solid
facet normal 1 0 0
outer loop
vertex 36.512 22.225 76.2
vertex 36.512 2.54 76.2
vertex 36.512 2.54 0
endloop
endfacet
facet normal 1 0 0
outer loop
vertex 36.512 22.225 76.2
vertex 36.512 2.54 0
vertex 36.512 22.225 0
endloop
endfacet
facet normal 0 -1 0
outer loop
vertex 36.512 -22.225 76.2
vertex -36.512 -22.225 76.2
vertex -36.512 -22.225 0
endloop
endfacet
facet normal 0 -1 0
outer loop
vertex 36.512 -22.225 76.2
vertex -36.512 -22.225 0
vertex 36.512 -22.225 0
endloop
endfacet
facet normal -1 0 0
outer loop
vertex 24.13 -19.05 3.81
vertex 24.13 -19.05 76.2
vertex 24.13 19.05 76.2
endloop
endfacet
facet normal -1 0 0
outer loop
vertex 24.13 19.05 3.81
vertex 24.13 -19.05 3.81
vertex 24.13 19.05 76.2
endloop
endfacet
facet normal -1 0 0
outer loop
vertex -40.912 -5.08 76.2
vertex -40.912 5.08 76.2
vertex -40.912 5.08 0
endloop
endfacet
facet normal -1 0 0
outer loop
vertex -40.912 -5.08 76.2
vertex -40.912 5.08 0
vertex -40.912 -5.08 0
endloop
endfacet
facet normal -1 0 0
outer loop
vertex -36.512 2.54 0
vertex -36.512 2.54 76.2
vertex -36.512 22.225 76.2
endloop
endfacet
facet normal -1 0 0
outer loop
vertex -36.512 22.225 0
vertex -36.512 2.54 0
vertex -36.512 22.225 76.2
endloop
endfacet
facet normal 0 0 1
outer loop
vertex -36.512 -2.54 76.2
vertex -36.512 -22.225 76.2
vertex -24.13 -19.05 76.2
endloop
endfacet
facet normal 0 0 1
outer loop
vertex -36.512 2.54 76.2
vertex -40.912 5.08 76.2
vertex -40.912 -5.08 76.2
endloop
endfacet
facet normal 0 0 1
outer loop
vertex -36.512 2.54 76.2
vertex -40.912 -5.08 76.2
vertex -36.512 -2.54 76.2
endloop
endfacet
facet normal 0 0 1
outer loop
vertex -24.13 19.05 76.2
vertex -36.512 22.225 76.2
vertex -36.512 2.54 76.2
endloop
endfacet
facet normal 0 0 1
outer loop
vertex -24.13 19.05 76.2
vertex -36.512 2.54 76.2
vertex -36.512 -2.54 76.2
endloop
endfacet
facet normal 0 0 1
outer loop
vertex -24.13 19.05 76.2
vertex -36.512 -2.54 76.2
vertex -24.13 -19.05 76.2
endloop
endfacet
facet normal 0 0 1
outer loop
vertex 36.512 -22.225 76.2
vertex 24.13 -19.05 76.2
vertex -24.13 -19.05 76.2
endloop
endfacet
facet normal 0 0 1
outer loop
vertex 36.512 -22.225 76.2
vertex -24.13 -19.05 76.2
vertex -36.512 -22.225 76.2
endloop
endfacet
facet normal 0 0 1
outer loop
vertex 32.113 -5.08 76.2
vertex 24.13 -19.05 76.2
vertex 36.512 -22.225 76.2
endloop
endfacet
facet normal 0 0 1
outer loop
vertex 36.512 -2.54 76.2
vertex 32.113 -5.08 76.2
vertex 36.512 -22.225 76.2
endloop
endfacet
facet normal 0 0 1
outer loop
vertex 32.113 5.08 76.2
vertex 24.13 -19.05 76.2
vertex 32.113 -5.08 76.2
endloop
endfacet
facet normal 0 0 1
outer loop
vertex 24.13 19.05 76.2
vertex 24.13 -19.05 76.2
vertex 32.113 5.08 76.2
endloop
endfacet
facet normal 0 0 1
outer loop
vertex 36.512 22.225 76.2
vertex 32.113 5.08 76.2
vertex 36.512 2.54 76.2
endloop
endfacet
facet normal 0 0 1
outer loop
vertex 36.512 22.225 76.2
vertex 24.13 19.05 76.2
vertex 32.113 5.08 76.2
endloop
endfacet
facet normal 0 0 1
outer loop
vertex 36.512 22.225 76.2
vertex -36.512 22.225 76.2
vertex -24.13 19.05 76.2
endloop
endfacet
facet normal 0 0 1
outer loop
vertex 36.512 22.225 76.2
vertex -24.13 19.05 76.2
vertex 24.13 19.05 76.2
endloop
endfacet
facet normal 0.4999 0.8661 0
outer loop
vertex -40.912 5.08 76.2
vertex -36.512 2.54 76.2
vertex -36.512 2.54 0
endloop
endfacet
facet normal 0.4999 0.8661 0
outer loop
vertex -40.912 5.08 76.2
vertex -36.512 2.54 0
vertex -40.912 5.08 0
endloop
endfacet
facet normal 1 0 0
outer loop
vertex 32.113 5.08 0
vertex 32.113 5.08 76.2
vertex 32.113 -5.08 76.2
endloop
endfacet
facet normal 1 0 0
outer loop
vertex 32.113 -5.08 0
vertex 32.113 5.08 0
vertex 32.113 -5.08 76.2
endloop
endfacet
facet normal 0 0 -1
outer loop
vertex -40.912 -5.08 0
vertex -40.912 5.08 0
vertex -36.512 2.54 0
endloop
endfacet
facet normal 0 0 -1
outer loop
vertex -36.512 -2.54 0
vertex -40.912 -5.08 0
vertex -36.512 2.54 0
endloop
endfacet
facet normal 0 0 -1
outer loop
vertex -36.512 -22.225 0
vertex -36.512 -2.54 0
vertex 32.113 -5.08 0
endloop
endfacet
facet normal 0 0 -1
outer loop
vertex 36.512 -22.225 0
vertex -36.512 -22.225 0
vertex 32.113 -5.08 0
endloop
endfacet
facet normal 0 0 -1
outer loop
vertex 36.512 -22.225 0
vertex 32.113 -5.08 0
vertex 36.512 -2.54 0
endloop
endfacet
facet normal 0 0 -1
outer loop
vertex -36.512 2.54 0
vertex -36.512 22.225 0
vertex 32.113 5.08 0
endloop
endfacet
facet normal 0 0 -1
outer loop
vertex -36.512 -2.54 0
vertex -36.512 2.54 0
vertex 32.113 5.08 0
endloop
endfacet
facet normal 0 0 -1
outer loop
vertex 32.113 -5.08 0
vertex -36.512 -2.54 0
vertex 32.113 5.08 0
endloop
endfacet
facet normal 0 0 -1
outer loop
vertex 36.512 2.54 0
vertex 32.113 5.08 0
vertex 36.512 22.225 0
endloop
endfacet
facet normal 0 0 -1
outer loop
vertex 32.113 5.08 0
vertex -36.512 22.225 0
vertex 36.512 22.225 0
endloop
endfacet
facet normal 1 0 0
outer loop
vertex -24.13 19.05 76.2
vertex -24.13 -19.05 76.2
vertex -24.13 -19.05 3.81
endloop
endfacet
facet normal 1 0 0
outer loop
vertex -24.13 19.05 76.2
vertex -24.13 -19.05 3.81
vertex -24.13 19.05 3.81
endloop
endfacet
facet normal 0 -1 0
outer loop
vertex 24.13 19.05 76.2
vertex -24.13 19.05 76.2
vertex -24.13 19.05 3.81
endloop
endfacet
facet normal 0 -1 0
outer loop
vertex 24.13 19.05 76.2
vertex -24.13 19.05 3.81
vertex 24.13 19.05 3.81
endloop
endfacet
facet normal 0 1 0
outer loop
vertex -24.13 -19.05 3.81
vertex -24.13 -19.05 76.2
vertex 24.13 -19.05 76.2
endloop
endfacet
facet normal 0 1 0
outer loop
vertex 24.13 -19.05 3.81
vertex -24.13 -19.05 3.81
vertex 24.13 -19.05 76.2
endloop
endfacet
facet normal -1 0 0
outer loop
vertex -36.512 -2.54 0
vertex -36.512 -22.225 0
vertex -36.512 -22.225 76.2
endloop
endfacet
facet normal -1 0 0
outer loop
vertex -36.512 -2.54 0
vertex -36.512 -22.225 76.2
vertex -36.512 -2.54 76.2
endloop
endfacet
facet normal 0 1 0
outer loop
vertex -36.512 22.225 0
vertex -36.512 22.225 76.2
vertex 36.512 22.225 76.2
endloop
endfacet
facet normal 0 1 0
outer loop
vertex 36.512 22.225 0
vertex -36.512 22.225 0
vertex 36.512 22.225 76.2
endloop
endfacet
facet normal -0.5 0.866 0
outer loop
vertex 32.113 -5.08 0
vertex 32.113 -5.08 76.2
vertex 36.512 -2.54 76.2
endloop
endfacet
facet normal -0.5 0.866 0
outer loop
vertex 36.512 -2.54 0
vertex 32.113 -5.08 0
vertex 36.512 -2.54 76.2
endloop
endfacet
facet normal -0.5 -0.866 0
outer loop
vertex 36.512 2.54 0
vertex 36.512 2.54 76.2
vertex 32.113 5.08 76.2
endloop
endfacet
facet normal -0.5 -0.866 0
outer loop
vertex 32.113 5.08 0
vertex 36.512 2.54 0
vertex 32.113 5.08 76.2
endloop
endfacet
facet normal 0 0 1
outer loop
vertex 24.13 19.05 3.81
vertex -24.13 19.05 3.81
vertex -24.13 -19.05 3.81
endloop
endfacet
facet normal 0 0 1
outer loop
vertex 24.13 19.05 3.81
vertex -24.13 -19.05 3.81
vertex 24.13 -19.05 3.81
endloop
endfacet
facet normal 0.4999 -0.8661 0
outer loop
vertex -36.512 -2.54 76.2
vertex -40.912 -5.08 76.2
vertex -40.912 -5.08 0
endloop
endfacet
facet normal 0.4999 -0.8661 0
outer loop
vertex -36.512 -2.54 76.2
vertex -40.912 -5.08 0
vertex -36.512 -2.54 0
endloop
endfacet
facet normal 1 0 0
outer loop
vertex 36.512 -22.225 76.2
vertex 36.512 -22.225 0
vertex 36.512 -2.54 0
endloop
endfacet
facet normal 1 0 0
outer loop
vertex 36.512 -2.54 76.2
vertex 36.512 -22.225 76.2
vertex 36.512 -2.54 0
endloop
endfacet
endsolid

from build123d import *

# Parameters (mm, degrees)
F0_W     = 73.025
F0_H     = 44.45
F1_DEPTH = 76.2
F2_W     = 48.26
F2_H     = 38.1
F3_DEPTH = 72.39
F5_DEPTH = 76.2
F6_DEPTH = 76.2


with BuildPart() as f1:
    # F0 (on Top) → F1 (new body)
    with BuildSketch(Plane.XY):
        Rectangle(F0_W, F0_H)
    extrude(amount=F1_DEPTH)

    # F2 (on face) → F3 (cut)
    with BuildSketch(Plane.XY.offset(76.2)):
        Rectangle(F2_W, F2_H)
    extrude(amount=-F3_DEPTH, mode=Mode.SUBTRACT)

    # F4 (on face) → F5 (cut)
    with BuildSketch(Plane.XY.offset(76.2)):
        Polygon((36.5125, -2.54), (36.5125, 0), (36.5125, 2.54), (32.113091, 5.08), (32.113091, -5.08), align=None)
    extrude(amount=-F5_DEPTH, mode=Mode.SUBTRACT)

    # F4 (on face) → F6 (join)
    with BuildSketch(Plane.XY.offset(76.2)):
        Polygon((-36.5125, 0), (-36.5125, 2.54), (-40.911909, 5.08), (-40.911909, -5.08), (-36.5125, -2.54), align=None)
    extrude(amount=-F6_DEPTH)


solid = f1.part
